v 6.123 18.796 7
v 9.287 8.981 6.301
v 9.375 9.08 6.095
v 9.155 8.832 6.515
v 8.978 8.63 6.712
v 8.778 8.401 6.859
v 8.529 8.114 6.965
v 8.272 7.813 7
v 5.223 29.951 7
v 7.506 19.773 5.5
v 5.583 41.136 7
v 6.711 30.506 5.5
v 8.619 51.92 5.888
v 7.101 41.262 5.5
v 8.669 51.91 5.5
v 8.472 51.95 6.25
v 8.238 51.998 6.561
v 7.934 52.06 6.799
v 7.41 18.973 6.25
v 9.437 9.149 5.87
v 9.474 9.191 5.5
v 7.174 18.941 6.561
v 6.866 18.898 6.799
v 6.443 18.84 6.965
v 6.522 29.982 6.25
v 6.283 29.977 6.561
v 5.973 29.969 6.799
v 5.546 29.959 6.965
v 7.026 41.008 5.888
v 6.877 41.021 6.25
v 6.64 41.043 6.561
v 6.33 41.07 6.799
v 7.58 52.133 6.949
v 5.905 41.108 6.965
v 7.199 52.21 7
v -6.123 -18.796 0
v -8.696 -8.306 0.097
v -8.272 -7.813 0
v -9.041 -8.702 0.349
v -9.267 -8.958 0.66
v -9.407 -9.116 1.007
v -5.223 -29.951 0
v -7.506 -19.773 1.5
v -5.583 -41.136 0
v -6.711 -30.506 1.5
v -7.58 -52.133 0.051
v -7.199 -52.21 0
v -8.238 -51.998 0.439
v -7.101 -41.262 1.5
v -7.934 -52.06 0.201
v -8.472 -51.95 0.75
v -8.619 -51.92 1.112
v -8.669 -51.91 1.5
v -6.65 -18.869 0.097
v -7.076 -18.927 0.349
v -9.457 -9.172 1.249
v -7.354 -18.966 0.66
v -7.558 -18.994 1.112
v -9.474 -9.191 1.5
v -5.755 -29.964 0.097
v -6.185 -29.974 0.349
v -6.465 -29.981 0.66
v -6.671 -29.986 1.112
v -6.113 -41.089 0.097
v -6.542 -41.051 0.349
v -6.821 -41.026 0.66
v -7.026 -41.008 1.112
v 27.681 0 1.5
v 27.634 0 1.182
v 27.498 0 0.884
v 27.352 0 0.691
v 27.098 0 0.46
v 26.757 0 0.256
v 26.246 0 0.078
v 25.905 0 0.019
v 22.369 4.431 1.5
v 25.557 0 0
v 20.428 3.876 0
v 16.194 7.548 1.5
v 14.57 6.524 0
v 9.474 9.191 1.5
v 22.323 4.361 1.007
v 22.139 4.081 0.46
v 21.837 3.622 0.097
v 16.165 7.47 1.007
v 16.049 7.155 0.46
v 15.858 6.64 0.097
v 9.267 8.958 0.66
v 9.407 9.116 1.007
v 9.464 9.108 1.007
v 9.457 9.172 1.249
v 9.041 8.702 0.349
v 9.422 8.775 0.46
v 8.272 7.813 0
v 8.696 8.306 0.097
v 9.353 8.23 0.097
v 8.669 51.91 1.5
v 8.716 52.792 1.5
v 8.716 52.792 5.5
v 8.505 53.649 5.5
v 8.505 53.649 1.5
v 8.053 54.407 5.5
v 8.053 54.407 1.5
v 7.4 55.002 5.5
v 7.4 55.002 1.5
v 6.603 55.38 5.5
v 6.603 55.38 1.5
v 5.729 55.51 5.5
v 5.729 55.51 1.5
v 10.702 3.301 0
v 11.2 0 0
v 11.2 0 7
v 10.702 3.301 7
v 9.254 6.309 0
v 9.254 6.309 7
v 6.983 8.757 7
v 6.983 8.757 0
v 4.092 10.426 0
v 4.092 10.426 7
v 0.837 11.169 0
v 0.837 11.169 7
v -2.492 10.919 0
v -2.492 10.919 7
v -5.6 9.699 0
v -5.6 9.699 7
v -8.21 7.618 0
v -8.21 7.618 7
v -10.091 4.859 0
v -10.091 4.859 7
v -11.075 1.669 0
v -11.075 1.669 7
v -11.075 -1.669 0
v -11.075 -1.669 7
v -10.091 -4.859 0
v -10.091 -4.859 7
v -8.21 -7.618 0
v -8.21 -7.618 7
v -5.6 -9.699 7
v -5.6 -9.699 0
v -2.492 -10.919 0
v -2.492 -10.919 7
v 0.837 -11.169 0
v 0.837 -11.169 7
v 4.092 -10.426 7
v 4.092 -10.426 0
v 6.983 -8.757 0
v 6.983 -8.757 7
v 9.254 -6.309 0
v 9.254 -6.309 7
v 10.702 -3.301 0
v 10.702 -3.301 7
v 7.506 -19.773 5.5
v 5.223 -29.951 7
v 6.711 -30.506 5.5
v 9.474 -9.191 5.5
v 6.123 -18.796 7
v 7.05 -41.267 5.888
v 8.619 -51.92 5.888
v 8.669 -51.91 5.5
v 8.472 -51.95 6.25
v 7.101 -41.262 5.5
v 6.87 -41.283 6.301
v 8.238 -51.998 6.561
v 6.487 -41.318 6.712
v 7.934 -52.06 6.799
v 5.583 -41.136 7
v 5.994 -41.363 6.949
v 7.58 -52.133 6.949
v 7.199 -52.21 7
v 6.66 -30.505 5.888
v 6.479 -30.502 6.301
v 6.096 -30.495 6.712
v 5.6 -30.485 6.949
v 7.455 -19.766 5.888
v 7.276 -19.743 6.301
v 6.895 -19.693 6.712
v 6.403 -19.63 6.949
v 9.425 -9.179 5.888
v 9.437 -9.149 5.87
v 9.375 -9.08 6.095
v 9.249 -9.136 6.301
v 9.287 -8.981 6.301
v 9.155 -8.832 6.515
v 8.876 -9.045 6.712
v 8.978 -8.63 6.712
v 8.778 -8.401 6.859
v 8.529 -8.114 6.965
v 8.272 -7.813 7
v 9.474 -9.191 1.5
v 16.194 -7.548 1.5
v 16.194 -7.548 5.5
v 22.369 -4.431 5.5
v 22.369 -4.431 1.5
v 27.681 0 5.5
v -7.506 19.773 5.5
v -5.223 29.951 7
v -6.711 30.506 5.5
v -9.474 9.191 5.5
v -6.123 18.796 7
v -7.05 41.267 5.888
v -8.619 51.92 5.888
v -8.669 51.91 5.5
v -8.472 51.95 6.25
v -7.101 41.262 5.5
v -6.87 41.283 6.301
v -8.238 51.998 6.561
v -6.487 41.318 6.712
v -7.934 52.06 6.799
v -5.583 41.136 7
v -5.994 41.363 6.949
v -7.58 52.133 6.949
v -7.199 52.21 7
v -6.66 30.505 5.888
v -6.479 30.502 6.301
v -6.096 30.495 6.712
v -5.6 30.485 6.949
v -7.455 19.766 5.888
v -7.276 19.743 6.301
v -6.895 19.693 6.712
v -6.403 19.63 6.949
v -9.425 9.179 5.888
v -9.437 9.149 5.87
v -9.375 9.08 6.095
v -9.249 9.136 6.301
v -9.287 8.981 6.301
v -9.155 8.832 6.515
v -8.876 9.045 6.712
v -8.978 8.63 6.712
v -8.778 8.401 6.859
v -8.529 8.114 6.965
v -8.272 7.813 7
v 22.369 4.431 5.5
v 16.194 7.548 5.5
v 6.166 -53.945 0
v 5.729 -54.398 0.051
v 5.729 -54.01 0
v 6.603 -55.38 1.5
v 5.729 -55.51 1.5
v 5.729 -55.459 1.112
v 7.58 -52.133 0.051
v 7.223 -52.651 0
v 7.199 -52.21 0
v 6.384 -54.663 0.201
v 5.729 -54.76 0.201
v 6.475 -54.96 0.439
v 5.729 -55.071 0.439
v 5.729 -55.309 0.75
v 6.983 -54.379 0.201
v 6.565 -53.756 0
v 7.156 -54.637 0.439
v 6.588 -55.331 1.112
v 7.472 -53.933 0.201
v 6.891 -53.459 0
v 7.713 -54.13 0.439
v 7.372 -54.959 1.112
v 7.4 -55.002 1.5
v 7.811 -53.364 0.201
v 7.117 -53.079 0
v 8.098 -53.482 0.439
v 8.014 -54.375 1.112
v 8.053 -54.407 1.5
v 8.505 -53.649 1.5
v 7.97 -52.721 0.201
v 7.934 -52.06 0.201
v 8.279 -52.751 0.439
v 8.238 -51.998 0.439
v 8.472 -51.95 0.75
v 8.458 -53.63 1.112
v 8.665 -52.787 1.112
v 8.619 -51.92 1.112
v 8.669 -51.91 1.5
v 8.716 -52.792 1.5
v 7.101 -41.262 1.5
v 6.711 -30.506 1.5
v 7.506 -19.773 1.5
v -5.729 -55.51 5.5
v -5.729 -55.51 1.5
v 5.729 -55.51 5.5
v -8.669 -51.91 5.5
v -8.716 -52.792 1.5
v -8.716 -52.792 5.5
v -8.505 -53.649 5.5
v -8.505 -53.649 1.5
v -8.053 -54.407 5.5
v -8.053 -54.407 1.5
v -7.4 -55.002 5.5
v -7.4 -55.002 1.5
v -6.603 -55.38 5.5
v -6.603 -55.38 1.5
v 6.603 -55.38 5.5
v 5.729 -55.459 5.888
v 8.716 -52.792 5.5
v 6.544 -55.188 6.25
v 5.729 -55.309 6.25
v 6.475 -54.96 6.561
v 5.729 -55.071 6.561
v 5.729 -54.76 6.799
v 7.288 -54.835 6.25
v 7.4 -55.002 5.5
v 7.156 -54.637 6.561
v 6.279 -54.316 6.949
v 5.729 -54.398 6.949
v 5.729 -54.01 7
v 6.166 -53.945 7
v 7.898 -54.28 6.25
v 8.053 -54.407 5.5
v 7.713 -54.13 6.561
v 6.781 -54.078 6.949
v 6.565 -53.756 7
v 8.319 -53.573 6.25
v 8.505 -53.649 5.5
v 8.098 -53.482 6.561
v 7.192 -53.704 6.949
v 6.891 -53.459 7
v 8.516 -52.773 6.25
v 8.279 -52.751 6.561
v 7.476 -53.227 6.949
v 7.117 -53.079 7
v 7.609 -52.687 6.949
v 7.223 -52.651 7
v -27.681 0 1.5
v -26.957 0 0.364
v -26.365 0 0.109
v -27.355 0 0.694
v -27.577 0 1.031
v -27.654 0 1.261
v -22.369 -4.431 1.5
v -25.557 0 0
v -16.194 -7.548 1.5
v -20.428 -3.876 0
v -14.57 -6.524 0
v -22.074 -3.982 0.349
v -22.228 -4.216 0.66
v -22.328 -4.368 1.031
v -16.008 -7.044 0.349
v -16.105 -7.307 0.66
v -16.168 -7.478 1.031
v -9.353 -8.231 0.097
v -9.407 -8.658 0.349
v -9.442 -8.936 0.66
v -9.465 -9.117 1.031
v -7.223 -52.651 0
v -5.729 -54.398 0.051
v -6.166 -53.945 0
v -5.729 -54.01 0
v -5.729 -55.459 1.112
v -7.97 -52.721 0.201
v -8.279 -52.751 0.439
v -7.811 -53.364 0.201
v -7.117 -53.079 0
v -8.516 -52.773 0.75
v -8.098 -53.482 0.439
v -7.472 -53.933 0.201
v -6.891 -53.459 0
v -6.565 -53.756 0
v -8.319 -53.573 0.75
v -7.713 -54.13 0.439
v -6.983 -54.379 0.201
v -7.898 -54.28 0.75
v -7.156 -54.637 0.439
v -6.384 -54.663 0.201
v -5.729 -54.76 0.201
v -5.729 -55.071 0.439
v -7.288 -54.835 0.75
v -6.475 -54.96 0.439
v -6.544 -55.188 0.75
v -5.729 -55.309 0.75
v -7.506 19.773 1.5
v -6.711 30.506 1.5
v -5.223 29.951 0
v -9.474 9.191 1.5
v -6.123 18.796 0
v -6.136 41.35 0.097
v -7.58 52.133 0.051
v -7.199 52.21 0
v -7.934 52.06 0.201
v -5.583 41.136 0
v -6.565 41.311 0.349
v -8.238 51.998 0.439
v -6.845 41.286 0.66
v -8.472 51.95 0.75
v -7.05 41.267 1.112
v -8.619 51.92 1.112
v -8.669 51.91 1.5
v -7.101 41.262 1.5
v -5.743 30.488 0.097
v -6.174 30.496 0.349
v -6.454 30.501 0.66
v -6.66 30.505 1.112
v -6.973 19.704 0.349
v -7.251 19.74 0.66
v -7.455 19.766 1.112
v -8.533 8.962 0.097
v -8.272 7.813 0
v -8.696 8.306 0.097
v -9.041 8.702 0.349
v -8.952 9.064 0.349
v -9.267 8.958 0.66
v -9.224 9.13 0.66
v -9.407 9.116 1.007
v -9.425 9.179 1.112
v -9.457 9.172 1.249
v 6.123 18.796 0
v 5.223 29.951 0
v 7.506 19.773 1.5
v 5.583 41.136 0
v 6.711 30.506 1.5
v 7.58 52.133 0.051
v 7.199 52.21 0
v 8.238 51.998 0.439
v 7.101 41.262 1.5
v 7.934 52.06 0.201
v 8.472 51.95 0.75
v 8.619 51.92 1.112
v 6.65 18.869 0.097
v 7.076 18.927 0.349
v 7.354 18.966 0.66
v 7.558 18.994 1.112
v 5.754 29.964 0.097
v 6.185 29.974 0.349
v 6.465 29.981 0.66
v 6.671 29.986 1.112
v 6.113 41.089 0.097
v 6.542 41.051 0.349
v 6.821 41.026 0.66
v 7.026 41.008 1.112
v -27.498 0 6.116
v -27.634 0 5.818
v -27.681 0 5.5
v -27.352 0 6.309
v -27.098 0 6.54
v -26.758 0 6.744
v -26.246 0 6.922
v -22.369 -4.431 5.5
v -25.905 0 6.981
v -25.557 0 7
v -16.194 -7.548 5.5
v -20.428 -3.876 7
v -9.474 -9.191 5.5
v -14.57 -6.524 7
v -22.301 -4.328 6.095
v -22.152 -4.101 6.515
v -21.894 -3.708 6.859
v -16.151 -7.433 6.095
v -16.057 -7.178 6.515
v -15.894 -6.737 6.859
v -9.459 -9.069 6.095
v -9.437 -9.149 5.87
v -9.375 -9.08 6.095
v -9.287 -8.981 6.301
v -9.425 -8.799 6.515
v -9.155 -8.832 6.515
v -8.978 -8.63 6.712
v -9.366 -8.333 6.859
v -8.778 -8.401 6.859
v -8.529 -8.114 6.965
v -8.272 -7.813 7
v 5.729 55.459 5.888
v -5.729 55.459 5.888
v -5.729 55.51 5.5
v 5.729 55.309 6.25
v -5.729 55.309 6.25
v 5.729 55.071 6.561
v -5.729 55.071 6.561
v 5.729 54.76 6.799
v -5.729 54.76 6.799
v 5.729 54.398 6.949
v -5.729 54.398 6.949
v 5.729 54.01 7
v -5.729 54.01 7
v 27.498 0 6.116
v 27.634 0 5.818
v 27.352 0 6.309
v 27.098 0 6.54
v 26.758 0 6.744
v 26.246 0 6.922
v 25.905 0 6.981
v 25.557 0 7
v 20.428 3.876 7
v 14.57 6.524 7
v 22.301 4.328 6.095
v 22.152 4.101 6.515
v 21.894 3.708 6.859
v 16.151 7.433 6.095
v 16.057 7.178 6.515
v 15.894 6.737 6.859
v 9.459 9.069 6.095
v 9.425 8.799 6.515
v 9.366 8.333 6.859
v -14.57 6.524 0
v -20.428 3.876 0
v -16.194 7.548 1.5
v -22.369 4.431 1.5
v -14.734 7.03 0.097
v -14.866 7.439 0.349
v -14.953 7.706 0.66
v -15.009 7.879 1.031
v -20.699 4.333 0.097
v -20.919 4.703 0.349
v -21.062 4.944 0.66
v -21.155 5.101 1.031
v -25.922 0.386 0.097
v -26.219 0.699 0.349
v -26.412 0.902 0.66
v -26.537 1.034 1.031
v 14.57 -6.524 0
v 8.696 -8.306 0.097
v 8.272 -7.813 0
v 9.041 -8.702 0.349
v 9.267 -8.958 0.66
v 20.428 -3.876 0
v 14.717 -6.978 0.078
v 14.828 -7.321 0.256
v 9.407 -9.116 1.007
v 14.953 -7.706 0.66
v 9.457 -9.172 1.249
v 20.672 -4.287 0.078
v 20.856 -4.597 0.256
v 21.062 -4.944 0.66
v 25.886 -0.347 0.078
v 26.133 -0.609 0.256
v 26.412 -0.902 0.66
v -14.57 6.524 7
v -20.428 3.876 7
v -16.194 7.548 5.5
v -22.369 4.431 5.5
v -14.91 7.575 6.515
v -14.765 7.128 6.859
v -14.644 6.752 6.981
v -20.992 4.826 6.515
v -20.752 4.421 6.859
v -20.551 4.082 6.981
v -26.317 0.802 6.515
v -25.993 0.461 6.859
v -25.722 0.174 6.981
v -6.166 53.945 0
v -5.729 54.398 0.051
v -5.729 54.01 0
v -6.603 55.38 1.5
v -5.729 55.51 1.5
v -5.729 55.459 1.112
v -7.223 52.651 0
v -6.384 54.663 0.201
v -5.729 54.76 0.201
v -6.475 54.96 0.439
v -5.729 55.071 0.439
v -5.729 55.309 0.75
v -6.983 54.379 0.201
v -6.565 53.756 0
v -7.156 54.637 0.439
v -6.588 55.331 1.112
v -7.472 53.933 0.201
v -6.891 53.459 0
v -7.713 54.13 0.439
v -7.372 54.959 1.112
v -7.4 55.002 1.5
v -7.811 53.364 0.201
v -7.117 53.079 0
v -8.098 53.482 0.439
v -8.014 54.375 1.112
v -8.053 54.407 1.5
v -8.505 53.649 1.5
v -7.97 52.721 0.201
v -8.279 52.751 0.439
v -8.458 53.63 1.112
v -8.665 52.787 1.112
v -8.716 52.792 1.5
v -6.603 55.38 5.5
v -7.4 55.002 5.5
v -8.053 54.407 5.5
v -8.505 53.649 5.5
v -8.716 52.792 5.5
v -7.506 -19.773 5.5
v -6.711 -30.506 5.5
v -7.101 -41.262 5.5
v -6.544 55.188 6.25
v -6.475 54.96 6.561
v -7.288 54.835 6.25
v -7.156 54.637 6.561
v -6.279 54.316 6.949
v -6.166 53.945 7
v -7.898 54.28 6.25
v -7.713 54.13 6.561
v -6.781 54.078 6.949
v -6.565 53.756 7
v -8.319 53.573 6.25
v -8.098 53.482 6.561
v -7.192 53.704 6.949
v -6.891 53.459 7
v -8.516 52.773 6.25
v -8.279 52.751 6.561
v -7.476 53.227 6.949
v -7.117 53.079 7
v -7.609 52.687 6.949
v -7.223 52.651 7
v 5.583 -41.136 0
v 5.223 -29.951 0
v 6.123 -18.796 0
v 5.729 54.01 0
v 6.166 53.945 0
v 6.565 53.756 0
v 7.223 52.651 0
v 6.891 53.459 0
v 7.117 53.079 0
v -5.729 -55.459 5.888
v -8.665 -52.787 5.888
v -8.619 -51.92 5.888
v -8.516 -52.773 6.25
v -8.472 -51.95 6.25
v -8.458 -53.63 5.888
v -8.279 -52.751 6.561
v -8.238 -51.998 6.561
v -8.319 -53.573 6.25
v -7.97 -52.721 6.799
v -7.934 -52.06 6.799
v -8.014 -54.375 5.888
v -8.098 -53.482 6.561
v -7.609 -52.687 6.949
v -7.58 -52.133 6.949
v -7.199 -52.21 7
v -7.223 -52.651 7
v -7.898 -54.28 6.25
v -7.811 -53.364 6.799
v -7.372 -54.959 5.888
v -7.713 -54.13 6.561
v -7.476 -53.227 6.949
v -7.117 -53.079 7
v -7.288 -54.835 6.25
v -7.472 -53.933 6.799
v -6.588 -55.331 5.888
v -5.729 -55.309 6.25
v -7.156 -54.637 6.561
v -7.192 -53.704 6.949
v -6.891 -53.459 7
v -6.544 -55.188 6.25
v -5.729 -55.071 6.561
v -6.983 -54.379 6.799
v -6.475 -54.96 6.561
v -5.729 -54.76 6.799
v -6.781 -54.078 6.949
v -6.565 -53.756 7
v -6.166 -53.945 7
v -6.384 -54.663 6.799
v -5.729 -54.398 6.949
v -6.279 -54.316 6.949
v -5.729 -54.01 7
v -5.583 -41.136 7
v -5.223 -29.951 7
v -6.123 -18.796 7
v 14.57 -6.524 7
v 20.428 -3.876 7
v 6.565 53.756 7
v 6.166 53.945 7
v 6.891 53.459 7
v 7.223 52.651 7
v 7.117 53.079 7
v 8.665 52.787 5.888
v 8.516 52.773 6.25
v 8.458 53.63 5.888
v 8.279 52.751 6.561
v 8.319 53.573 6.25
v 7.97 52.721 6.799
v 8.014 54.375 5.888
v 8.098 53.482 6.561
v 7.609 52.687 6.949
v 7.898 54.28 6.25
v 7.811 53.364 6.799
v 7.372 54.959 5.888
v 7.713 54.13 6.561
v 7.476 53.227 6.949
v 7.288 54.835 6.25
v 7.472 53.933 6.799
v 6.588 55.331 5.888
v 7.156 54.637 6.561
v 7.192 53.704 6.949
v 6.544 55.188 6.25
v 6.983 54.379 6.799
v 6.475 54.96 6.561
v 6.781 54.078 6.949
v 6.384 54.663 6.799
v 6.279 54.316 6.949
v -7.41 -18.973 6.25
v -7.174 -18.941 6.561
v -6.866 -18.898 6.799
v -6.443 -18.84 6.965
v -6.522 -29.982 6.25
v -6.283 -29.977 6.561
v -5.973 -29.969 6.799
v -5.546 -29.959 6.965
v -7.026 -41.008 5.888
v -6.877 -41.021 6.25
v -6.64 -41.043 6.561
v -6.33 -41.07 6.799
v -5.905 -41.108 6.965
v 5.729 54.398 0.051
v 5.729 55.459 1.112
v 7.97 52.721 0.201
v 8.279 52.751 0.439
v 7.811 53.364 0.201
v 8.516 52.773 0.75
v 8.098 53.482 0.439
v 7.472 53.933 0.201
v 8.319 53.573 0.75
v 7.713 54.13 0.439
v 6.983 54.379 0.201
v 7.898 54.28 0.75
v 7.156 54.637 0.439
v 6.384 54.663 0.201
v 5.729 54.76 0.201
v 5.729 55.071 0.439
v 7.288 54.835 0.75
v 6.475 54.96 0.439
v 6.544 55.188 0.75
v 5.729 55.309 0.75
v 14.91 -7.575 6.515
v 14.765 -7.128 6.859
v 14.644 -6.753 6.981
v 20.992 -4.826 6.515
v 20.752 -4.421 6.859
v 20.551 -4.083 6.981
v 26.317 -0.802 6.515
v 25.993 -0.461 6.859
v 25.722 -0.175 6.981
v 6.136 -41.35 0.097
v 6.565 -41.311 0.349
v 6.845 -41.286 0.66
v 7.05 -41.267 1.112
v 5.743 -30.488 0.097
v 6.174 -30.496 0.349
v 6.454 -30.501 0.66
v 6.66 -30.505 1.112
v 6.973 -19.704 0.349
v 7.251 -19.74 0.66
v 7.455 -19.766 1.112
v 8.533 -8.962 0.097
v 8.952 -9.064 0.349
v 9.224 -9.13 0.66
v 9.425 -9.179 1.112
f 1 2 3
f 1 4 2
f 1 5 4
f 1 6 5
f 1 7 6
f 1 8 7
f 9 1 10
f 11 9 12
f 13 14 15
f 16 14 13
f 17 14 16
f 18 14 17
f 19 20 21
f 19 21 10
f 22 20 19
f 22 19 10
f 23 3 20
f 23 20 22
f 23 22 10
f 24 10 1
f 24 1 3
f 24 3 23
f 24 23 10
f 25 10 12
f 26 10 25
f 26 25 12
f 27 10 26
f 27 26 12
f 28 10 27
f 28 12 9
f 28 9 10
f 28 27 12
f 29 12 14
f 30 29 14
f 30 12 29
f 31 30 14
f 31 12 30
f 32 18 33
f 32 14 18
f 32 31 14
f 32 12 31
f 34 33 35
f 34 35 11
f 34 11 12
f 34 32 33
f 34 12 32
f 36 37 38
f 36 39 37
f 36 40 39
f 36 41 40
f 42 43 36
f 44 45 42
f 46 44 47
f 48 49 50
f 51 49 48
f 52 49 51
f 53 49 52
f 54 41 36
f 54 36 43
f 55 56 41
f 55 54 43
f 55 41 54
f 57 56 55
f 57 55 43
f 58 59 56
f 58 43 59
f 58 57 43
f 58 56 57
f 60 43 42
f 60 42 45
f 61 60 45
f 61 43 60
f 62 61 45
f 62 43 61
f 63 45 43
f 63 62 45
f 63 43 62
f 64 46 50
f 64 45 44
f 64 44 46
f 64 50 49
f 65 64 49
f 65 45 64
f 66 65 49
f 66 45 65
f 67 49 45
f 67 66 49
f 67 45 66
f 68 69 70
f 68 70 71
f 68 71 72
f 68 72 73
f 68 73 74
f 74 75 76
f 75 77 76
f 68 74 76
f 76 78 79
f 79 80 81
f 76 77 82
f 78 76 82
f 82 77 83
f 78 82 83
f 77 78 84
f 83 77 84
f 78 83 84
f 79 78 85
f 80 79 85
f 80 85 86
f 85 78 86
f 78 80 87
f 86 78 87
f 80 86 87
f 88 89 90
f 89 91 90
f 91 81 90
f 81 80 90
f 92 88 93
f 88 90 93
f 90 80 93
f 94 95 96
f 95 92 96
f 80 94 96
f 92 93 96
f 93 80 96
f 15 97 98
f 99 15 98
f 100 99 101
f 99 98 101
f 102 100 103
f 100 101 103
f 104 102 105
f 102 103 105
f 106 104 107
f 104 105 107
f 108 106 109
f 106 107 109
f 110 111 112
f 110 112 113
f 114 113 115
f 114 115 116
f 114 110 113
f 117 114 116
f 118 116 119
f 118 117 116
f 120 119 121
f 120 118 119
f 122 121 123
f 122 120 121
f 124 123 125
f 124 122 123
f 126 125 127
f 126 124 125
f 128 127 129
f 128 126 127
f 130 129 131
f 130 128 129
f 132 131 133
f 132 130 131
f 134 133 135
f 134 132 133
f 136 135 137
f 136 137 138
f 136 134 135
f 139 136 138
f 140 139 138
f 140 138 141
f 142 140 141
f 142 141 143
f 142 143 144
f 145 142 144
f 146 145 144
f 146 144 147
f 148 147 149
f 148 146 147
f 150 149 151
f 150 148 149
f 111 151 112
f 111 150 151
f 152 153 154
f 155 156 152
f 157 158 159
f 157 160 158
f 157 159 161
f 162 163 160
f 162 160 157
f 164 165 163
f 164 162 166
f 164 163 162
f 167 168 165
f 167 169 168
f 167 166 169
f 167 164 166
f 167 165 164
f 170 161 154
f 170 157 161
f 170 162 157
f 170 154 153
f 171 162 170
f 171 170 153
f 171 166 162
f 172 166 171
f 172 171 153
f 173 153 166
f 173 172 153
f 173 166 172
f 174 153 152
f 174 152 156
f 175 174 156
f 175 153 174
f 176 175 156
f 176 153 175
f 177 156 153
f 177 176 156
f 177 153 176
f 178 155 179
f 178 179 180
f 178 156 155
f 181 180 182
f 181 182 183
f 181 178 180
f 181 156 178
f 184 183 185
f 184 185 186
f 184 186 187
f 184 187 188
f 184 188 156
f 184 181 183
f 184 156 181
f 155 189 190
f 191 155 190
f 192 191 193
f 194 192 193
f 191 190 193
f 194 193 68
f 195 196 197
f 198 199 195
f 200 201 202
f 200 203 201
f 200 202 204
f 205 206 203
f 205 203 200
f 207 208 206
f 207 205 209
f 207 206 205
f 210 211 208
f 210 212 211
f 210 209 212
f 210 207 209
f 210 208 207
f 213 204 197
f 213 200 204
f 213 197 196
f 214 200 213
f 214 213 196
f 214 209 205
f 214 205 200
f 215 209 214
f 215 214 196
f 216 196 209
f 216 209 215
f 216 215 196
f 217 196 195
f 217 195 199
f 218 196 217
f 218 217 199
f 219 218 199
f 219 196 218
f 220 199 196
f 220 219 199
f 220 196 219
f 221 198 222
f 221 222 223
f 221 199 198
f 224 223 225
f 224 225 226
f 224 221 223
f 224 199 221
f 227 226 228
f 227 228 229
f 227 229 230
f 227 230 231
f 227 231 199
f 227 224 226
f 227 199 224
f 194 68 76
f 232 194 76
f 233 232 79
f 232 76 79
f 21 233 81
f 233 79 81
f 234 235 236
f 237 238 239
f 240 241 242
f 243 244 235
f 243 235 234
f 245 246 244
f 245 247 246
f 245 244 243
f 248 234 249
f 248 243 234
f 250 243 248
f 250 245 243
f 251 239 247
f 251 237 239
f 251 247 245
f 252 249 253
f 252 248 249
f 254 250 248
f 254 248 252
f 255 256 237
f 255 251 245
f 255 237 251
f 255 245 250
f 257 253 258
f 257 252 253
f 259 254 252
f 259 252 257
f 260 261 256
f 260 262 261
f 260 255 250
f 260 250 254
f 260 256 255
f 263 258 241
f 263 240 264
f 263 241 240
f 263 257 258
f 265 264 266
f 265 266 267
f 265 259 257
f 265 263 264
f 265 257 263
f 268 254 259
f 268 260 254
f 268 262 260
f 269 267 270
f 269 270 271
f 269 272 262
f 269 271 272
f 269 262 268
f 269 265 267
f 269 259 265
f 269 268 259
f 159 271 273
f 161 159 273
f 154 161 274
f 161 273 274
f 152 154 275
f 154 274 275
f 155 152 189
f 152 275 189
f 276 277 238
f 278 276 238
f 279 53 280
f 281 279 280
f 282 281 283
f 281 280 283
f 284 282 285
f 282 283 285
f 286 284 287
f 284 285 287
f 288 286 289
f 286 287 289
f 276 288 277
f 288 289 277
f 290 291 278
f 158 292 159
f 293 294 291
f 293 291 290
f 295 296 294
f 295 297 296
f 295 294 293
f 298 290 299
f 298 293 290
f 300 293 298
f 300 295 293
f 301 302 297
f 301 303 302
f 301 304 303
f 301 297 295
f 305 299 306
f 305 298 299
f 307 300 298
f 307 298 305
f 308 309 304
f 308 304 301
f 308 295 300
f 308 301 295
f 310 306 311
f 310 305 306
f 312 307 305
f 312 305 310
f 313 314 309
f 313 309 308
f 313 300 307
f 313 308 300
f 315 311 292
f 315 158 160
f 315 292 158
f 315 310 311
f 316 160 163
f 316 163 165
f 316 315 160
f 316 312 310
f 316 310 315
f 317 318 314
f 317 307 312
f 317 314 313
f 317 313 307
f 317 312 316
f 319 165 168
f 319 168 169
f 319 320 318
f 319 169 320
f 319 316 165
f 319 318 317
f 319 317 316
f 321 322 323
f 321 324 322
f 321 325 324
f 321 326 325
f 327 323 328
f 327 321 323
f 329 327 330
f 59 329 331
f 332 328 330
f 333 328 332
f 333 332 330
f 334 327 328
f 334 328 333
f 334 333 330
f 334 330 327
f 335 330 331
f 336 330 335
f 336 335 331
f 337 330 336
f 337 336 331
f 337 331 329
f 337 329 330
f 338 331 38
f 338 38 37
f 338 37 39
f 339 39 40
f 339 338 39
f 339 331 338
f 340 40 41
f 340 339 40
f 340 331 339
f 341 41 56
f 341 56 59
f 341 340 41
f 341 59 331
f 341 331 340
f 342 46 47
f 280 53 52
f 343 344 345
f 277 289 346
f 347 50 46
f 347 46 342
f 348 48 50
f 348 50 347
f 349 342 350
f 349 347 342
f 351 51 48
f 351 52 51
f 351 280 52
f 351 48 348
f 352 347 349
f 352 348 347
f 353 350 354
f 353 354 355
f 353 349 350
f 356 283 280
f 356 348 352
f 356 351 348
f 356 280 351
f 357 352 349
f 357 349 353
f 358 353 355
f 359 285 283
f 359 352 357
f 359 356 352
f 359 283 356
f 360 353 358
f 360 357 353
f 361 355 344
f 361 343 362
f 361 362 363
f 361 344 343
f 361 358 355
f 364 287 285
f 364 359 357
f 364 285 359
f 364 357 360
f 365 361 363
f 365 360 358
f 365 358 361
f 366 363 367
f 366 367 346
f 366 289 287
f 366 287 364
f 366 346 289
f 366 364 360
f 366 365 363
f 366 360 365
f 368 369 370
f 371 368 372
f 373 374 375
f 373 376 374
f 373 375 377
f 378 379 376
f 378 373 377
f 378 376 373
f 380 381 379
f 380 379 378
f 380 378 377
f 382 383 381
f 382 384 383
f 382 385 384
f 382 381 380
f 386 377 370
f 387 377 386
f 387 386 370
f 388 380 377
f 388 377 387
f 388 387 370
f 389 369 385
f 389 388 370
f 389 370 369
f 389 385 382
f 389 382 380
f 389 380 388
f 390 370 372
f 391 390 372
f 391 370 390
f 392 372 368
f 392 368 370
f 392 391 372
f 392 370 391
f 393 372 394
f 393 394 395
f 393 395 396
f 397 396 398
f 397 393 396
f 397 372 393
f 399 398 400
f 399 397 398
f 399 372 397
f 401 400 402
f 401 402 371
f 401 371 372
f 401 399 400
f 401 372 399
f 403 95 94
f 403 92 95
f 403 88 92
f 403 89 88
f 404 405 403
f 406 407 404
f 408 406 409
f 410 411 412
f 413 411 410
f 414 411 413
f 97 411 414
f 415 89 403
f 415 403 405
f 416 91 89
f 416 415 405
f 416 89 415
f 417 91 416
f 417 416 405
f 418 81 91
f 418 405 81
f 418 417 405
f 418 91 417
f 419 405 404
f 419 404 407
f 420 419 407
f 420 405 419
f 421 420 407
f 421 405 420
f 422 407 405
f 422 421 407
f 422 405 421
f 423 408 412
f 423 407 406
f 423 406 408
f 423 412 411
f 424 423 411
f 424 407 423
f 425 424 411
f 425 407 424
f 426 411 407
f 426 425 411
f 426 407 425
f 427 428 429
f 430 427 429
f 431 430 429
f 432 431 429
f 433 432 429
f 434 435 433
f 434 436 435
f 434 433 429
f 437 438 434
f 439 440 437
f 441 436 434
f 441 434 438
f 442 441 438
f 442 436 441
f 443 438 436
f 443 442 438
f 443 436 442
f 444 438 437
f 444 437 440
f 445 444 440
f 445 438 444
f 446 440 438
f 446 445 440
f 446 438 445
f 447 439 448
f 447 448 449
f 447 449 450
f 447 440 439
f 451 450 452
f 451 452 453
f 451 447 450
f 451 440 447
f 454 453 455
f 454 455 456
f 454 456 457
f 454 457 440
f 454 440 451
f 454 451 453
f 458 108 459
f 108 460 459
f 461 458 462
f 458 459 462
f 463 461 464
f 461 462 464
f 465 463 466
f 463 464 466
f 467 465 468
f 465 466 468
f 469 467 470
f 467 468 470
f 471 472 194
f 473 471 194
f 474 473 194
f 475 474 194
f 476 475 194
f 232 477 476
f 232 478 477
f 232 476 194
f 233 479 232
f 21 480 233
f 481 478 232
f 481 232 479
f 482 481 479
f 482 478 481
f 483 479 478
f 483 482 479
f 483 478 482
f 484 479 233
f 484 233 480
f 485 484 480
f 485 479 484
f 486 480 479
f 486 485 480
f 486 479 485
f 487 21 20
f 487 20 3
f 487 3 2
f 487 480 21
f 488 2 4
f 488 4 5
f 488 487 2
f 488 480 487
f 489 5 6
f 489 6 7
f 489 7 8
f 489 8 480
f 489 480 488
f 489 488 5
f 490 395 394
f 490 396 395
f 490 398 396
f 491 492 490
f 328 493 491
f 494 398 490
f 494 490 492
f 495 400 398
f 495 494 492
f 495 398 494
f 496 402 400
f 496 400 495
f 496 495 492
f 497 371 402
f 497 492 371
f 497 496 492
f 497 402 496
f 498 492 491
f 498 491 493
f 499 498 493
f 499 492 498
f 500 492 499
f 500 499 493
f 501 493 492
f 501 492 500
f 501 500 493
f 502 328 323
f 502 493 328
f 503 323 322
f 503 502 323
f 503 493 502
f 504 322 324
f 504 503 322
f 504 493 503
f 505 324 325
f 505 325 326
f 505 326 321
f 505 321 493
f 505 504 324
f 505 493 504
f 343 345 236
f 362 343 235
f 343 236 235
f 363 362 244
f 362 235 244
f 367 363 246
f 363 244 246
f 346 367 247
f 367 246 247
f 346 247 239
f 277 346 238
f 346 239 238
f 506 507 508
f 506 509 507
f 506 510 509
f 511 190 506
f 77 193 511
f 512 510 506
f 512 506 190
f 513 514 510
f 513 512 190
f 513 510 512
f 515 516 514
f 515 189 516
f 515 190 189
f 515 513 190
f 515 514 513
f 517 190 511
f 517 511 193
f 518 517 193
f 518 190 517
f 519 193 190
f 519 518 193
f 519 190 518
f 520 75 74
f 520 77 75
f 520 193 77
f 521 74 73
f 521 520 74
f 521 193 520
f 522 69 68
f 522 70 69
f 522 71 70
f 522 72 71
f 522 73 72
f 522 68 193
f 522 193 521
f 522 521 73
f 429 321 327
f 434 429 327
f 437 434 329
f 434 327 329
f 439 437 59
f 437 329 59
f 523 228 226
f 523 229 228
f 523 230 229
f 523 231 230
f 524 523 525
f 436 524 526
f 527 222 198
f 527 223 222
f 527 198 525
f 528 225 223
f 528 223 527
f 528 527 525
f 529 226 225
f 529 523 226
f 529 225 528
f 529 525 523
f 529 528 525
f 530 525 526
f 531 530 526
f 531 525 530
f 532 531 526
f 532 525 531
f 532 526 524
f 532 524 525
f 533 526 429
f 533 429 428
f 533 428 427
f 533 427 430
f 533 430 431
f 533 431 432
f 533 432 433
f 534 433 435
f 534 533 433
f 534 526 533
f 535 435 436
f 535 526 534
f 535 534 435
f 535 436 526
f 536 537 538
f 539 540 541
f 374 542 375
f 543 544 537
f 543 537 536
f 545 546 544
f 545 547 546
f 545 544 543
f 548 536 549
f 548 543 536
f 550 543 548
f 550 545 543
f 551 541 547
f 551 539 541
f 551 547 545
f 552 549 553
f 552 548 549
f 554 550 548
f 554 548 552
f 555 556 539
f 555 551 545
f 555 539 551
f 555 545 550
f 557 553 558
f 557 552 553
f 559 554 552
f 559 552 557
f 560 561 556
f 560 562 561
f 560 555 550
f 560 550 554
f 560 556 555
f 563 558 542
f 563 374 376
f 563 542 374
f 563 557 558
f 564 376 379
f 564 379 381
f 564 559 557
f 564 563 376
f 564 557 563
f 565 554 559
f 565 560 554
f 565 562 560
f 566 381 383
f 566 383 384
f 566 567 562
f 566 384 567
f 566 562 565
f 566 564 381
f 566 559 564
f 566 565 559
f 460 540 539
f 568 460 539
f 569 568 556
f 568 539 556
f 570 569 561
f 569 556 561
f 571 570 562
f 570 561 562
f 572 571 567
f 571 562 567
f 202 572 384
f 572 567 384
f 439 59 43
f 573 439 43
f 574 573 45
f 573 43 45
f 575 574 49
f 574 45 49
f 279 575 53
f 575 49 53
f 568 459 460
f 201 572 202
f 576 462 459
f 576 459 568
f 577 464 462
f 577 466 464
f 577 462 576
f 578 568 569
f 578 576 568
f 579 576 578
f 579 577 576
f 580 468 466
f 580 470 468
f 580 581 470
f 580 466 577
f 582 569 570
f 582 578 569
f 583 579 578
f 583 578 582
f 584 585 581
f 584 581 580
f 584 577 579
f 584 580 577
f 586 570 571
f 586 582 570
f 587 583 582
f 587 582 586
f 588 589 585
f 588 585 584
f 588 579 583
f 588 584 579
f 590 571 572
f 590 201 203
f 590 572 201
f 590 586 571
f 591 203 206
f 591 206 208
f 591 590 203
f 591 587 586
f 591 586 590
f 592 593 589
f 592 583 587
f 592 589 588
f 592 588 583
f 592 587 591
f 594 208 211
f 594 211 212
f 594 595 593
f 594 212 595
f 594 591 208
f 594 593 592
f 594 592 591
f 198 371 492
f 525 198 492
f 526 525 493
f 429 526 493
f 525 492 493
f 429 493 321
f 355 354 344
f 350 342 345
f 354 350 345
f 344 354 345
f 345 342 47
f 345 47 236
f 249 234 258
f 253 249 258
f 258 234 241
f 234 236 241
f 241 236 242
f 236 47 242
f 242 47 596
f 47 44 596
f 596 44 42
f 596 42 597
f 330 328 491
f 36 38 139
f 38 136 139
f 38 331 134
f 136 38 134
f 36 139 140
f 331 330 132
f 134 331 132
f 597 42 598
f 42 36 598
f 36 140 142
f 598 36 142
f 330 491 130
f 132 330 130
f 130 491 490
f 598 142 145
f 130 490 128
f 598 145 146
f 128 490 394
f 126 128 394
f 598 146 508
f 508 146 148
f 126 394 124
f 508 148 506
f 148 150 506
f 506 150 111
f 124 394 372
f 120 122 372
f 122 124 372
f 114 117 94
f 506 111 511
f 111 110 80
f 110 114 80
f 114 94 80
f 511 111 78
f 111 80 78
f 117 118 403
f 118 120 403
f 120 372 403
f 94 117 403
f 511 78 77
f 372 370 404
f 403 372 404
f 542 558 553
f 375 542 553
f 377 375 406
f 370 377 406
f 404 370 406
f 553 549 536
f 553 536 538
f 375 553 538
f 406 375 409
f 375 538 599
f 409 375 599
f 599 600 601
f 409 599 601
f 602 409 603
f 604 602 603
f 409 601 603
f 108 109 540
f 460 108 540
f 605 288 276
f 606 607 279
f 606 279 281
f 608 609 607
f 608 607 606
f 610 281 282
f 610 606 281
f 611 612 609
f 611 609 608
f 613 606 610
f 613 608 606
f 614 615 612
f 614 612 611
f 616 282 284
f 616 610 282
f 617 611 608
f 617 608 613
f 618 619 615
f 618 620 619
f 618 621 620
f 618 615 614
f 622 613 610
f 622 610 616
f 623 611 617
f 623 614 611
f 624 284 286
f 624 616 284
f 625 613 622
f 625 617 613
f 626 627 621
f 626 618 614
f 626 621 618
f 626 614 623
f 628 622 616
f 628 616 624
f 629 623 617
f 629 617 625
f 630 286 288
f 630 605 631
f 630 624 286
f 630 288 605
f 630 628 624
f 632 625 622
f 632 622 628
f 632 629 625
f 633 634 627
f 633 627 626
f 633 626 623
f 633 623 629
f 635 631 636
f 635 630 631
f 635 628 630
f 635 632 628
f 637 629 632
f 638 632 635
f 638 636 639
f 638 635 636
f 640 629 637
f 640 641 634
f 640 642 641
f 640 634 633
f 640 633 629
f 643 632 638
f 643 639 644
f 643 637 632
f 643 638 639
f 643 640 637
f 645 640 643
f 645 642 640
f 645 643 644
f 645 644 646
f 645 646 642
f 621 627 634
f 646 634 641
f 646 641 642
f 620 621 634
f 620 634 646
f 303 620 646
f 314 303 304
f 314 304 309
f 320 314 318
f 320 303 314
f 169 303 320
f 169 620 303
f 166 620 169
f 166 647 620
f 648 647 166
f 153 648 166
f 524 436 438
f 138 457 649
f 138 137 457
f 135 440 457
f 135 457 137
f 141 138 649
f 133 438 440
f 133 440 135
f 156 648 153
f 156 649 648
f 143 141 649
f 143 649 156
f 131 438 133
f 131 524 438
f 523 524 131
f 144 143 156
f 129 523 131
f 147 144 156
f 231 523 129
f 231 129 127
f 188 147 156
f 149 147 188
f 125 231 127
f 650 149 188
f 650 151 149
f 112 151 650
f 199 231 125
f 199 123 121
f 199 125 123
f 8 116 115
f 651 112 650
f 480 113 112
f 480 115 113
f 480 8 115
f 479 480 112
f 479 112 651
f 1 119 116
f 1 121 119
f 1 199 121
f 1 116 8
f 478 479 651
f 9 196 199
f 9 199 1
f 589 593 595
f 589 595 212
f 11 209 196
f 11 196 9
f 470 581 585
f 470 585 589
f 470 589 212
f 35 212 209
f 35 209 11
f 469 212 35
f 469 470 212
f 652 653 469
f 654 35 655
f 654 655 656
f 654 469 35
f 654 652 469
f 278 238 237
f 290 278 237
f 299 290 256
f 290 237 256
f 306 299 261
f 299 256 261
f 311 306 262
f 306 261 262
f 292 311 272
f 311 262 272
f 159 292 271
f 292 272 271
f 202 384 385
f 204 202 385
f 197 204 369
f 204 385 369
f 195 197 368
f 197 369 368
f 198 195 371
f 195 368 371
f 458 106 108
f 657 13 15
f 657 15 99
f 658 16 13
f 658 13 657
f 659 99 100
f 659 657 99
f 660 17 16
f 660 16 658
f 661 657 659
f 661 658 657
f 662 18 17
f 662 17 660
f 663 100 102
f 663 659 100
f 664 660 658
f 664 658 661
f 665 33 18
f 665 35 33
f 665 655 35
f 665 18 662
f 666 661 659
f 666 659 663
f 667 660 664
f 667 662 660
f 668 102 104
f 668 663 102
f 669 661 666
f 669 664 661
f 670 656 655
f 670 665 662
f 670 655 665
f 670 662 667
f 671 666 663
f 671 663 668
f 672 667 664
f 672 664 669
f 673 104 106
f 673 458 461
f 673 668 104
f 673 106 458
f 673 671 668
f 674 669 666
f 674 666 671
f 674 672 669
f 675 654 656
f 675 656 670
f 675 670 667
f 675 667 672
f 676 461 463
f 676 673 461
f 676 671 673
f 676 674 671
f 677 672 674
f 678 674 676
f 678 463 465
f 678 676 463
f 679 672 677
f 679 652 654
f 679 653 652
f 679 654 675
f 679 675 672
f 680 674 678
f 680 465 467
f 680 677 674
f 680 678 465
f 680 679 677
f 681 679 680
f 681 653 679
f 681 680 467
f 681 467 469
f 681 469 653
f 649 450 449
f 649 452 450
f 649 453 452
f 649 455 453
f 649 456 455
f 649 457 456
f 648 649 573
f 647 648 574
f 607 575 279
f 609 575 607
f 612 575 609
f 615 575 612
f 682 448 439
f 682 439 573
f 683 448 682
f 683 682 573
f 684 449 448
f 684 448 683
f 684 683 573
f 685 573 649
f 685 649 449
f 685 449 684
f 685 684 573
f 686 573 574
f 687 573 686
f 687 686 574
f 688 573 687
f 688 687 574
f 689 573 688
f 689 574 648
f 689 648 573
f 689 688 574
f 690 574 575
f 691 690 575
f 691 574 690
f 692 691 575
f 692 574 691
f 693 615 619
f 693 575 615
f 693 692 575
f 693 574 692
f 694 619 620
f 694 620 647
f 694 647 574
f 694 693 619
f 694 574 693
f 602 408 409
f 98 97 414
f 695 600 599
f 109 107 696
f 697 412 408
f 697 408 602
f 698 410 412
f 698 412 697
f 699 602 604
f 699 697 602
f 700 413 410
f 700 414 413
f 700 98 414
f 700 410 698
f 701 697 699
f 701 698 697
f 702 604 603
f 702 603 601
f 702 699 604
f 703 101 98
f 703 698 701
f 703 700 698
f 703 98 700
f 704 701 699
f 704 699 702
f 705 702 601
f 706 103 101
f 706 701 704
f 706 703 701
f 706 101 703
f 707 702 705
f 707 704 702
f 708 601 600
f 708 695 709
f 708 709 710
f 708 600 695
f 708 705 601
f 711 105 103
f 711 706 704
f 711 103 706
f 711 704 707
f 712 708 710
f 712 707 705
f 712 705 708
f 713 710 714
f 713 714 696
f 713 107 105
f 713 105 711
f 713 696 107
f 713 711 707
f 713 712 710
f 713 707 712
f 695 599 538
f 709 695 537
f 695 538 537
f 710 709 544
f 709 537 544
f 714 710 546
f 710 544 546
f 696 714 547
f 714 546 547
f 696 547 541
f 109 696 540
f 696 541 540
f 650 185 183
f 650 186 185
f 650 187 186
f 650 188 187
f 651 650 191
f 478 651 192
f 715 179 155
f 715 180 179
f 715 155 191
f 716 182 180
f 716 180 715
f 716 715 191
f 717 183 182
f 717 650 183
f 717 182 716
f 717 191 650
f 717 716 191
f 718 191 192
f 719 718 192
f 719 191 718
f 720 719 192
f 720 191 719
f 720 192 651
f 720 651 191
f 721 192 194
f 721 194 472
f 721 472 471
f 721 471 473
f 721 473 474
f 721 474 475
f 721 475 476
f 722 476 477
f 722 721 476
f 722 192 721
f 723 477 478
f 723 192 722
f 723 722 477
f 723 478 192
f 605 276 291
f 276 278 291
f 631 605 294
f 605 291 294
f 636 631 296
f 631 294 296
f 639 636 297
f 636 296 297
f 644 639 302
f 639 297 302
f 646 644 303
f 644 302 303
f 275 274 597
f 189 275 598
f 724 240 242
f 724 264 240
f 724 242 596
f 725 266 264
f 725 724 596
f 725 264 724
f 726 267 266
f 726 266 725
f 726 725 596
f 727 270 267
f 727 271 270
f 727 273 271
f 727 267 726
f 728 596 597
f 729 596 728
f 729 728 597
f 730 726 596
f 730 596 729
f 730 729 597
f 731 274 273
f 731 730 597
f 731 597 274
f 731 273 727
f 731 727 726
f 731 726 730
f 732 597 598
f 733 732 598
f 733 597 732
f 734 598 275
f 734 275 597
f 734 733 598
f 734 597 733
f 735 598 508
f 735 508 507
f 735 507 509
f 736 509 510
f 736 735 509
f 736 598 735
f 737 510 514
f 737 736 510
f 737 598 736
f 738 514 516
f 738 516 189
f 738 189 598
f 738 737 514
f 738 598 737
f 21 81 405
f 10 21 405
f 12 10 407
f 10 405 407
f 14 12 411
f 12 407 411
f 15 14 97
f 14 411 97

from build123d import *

# Parameters (mm, degrees)
F0_R     = 11.2
F1_DEPTH = 7
F2_R     = 1.5
F3_R     = 1.5


with BuildPart() as f1:
    # F0 (on Top) → F1 (new body)
    with BuildSketch(Plane.XY):
        with BuildLine():
            ThreePointArc((9.474284, 9.191188), (6.71139, 30.50623), (8.668923, 51.910264))
            ThreePointArc((8.668923, 51.910264), (8.053166, 54.407448), (5.729473, 55.509962))
            Line((5.729473, 55.509962), (-5.729473, 55.509962))
            ThreePointArc((-5.729473, 55.509962), (-8.053166, 54.407448), (-8.668923, 51.910264))
            ThreePointArc((-8.668923, 51.910264), (-6.71139, 30.50623), (-9.474284, 9.191188))
            ThreePointArc((-9.474284, 9.191188), (-19.370215, 6.165663), (-27.68092, 0))
            ThreePointArc((-27.68092, 0), (-19.370215, -6.165663), (-9.474284, -9.191188))
            ThreePointArc((-9.474284, -9.191188), (-6.71139, -30.50623), (-8.668923, -51.910264))
            ThreePointArc((-8.668923, -51.910264), (-8.053166, -54.407448), (-5.729473, -55.509962))
            Line((-5.729473, -55.509962), (5.729473, -55.509962))
            ThreePointArc((5.729473, -55.509962), (8.053166, -54.407448), (8.668923, -51.910264))
            ThreePointArc((8.668923, -51.910264), (6.71139, -30.50623), (9.474284, -9.191188))
            ThreePointArc((9.474284, -9.191188), (19.370215, -6.165663), (27.68092, 0))
            ThreePointArc((27.68092, 0), (19.370215, 6.165663), (9.474284, 9.191188))
        make_face()
        Circle(F0_R, mode=Mode.SUBTRACT)
    extrude(amount=F1_DEPTH)

    # F2
    f2_edges = [f1.edges().sort_by_distance(p)[0] for p in [
        (6.71139, -30.50623, 7),
        (-6.71139, -30.50623, 7),
        (-6.71139, 30.50623, 7),
        (0, 55.509962, 7),
        (6.71139, 30.50623, 7),
        (19.370215, 6.165663, 7),
        (19.370215, -6.165663, 7),
        (-19.370215, 6.165663, 7),
        (-19.370215, -6.165663, 7),
        (0, -55.509962, 7),
    ]]
    fillet(f2_edges, radius=F2_R)

    # F3
    f3_edges = [f1.edges().sort_by_distance(p)[0] for p in [
        (0, -55.509962, 0),
        (8.053166, -54.407448, 0),
        (-19.370215, -6.165663, 0),
        (-19.370215, 6.165663, 0),
        (-6.71139, 30.50623, 0),
        (6.71139, 30.50623, 0),
        (19.370215, 6.165663, 0),
        (19.370215, -6.165663, 0),
    ]]
    fillet(f3_edges, radius=F3_R)


solid = f1.part
